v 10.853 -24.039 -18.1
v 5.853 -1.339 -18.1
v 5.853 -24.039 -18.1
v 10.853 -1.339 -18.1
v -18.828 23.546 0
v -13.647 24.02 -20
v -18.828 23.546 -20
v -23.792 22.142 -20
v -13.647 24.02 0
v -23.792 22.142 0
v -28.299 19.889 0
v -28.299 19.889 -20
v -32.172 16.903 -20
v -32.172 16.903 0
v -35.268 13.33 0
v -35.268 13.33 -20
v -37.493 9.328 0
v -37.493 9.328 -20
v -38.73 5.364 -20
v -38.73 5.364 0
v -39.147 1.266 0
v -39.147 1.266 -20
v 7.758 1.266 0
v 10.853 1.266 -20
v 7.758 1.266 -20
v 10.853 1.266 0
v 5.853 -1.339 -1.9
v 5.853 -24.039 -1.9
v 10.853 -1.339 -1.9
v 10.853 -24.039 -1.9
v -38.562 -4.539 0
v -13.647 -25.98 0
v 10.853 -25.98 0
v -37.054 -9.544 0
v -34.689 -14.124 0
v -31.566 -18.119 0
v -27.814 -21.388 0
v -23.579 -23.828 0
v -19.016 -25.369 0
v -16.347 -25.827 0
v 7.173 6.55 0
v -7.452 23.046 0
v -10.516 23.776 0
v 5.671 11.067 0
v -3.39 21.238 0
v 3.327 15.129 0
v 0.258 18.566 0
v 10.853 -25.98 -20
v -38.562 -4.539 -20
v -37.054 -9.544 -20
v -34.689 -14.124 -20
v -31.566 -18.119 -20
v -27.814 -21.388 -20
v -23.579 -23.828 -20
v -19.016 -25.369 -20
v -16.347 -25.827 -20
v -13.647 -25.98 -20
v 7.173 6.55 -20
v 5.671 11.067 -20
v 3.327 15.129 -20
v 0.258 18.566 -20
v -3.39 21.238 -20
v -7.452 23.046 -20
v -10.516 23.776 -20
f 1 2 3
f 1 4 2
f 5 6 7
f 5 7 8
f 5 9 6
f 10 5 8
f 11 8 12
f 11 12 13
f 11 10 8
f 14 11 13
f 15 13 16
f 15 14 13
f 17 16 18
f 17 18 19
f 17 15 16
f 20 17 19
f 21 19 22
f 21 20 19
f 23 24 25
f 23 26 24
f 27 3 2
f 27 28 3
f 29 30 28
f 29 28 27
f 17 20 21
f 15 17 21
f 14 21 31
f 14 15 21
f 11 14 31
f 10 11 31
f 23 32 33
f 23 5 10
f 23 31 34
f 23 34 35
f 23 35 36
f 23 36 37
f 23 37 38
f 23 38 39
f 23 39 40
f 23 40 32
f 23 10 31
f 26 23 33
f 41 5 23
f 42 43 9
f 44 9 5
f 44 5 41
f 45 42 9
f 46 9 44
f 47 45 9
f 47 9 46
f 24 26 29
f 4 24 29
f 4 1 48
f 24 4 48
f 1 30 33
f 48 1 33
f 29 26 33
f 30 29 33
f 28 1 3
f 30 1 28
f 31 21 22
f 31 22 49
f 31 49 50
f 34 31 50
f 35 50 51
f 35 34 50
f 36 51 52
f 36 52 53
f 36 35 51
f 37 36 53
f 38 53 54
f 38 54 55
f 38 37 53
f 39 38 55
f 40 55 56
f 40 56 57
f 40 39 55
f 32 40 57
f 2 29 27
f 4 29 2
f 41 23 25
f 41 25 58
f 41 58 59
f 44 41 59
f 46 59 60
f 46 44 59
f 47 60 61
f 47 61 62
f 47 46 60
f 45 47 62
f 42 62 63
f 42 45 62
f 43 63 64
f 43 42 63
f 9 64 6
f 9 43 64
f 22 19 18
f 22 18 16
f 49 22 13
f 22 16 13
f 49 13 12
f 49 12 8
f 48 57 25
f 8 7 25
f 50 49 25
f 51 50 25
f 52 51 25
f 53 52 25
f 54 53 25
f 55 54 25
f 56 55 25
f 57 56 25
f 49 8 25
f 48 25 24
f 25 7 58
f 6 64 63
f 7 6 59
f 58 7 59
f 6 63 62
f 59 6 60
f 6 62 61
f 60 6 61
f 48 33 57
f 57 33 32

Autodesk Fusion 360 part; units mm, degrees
sketch "草图1" plane through (0, 0, 0) normal (0, 0, 1) x (1, 0, 0)
  circle A0 centre (-13.6473, 1.2662) radius 16.75
  circle A1 centre (-13.6473, 1.2662) radius 11
  circle A2 centre (3.8527, 20.9662) radius 2
  circle A3 centre (-33.9473, -22.0338) radius 2
  line L0 (10.8527, -25.9797) -> (-13.6473, -25.9797)
  line L1 (-13.6473, -25.9797) -> (-13.6473, 1.2662)
  line L2 (-13.6473, 1.2662) -> (10.8527, 1.2662)
  line L3 (10.8527, 1.2662) -> (10.8527, -25.9797)
  line L4 (10.8527, -25.9797) -> (-39.1473, -25.9797)
  line L5 (-39.1473, -25.9797) -> (-39.1473, 24.0203)
  line L6 (-39.1473, 24.0203) -> (10.8527, 24.0203)
  line L7 (10.8527, 24.0203) -> (10.8527, -25.9797)
  dimension "d1" = 33.5
  dimension "d2" = 22
  dimension "d3" = 19.7
  dimension "d4" = 17.5
  dimension "d5" = 4
  dimension "d6" = 20.3
  dimension "d7" = 23.3
  dimension "d8" = 4
  dimension "d9" = 24.5
  dimension "d11" = 50
  dimension "d12" = 50
sketch "草图2" plane through (0, 0, 0) normal (0, 0, 1) x (1, 0, 0)
  line L0 (10.8527, 24.0203) -> (10.8527, -25.9797)
  line L1 (-39.1473, 24.0203) -> (10.8527, 24.0203)
  line L2 (-39.1473, -25.9797) -> (-39.1473, 24.0203)
  line L3 (10.8527, -25.9797) -> (-39.1473, -25.9797)
  line L4 (-13.6473, 1.2662) -> (-13.6473, 24.0203) construction
  line L5 (-13.6473, 1.2662) -> (10.8527, 1.2662) construction
  line L6 (-13.6473, 1.2662) -> (-39.1473, 1.2662) construction
  line L7 (-39.1473, 1.2662) -> (-13.6473, 1.2662)
  line L8 (-13.6473, -25.9797) -> (-13.6473, 1.2662) construction
  ellipse E0 centre (-13.6473, 1.2662) end of major axis (-13.6473, 24.0203) minor radius 21.4054 (7.7581, 1.2662) -> (-13.6473, 24.0203) ccw
  ellipse E1 centre (-13.6473, 1.2662) end of major axis (-13.6473, 24.0203) minor radius 25.5 (-13.6473, 24.0203) -> (-39.1473, 1.2662) ccw
  ellipse E2 centre (-13.6473, 1.2662) end of major axis (-39.1473, 1.2662) minor radius 27.2458 (-39.1473, 1.2662) -> (-13.6473, -25.9797) ccw
  line L9 (10.8527, 1.2662) -> (7.7581, 1.2662)
  point P0 (-13.6473, 1.2662)
extrude "拉伸1" add sketch "草图2" against normal blind 20 contours L0 L3 E0 E1 E2 L9
sketch "草图3" plane through (10.8527, 0, 0) normal (1, 0, 0) x (0, 1, 0)
  line L0 (1.2662, 0) -> (-25.9797, 0)
  line L1 (-25.9797, 0) -> (-25.9797, -20)
  line L2 (-25.9797, -20) -> (1.2662, -20)
  line L3 (1.2662, -20) -> (1.2662, 0)
  line L4 (-24.0386, -1.9) -> (-1.3386, -1.9)
  line L5 (-1.3386, -1.9) -> (-1.3386, -18.1)
  line L6 (-1.3386, -18.1) -> (-24.0386, -18.1)
  line L7 (-24.0386, -18.1) -> (-24.0386, -1.9)
  point P0 (-1.3386, -10)
  point P1 (1.2662, -10)
  point P2 (-12.3567, 0)
  point P3 (-12.6886, -1.9)
  dimension "d15" = 22.7
  dimension "d16" = 16.2
extrude "拉伸2" cut sketch "草图3" against normal blind 5 contours L4 L5 L6 L7
